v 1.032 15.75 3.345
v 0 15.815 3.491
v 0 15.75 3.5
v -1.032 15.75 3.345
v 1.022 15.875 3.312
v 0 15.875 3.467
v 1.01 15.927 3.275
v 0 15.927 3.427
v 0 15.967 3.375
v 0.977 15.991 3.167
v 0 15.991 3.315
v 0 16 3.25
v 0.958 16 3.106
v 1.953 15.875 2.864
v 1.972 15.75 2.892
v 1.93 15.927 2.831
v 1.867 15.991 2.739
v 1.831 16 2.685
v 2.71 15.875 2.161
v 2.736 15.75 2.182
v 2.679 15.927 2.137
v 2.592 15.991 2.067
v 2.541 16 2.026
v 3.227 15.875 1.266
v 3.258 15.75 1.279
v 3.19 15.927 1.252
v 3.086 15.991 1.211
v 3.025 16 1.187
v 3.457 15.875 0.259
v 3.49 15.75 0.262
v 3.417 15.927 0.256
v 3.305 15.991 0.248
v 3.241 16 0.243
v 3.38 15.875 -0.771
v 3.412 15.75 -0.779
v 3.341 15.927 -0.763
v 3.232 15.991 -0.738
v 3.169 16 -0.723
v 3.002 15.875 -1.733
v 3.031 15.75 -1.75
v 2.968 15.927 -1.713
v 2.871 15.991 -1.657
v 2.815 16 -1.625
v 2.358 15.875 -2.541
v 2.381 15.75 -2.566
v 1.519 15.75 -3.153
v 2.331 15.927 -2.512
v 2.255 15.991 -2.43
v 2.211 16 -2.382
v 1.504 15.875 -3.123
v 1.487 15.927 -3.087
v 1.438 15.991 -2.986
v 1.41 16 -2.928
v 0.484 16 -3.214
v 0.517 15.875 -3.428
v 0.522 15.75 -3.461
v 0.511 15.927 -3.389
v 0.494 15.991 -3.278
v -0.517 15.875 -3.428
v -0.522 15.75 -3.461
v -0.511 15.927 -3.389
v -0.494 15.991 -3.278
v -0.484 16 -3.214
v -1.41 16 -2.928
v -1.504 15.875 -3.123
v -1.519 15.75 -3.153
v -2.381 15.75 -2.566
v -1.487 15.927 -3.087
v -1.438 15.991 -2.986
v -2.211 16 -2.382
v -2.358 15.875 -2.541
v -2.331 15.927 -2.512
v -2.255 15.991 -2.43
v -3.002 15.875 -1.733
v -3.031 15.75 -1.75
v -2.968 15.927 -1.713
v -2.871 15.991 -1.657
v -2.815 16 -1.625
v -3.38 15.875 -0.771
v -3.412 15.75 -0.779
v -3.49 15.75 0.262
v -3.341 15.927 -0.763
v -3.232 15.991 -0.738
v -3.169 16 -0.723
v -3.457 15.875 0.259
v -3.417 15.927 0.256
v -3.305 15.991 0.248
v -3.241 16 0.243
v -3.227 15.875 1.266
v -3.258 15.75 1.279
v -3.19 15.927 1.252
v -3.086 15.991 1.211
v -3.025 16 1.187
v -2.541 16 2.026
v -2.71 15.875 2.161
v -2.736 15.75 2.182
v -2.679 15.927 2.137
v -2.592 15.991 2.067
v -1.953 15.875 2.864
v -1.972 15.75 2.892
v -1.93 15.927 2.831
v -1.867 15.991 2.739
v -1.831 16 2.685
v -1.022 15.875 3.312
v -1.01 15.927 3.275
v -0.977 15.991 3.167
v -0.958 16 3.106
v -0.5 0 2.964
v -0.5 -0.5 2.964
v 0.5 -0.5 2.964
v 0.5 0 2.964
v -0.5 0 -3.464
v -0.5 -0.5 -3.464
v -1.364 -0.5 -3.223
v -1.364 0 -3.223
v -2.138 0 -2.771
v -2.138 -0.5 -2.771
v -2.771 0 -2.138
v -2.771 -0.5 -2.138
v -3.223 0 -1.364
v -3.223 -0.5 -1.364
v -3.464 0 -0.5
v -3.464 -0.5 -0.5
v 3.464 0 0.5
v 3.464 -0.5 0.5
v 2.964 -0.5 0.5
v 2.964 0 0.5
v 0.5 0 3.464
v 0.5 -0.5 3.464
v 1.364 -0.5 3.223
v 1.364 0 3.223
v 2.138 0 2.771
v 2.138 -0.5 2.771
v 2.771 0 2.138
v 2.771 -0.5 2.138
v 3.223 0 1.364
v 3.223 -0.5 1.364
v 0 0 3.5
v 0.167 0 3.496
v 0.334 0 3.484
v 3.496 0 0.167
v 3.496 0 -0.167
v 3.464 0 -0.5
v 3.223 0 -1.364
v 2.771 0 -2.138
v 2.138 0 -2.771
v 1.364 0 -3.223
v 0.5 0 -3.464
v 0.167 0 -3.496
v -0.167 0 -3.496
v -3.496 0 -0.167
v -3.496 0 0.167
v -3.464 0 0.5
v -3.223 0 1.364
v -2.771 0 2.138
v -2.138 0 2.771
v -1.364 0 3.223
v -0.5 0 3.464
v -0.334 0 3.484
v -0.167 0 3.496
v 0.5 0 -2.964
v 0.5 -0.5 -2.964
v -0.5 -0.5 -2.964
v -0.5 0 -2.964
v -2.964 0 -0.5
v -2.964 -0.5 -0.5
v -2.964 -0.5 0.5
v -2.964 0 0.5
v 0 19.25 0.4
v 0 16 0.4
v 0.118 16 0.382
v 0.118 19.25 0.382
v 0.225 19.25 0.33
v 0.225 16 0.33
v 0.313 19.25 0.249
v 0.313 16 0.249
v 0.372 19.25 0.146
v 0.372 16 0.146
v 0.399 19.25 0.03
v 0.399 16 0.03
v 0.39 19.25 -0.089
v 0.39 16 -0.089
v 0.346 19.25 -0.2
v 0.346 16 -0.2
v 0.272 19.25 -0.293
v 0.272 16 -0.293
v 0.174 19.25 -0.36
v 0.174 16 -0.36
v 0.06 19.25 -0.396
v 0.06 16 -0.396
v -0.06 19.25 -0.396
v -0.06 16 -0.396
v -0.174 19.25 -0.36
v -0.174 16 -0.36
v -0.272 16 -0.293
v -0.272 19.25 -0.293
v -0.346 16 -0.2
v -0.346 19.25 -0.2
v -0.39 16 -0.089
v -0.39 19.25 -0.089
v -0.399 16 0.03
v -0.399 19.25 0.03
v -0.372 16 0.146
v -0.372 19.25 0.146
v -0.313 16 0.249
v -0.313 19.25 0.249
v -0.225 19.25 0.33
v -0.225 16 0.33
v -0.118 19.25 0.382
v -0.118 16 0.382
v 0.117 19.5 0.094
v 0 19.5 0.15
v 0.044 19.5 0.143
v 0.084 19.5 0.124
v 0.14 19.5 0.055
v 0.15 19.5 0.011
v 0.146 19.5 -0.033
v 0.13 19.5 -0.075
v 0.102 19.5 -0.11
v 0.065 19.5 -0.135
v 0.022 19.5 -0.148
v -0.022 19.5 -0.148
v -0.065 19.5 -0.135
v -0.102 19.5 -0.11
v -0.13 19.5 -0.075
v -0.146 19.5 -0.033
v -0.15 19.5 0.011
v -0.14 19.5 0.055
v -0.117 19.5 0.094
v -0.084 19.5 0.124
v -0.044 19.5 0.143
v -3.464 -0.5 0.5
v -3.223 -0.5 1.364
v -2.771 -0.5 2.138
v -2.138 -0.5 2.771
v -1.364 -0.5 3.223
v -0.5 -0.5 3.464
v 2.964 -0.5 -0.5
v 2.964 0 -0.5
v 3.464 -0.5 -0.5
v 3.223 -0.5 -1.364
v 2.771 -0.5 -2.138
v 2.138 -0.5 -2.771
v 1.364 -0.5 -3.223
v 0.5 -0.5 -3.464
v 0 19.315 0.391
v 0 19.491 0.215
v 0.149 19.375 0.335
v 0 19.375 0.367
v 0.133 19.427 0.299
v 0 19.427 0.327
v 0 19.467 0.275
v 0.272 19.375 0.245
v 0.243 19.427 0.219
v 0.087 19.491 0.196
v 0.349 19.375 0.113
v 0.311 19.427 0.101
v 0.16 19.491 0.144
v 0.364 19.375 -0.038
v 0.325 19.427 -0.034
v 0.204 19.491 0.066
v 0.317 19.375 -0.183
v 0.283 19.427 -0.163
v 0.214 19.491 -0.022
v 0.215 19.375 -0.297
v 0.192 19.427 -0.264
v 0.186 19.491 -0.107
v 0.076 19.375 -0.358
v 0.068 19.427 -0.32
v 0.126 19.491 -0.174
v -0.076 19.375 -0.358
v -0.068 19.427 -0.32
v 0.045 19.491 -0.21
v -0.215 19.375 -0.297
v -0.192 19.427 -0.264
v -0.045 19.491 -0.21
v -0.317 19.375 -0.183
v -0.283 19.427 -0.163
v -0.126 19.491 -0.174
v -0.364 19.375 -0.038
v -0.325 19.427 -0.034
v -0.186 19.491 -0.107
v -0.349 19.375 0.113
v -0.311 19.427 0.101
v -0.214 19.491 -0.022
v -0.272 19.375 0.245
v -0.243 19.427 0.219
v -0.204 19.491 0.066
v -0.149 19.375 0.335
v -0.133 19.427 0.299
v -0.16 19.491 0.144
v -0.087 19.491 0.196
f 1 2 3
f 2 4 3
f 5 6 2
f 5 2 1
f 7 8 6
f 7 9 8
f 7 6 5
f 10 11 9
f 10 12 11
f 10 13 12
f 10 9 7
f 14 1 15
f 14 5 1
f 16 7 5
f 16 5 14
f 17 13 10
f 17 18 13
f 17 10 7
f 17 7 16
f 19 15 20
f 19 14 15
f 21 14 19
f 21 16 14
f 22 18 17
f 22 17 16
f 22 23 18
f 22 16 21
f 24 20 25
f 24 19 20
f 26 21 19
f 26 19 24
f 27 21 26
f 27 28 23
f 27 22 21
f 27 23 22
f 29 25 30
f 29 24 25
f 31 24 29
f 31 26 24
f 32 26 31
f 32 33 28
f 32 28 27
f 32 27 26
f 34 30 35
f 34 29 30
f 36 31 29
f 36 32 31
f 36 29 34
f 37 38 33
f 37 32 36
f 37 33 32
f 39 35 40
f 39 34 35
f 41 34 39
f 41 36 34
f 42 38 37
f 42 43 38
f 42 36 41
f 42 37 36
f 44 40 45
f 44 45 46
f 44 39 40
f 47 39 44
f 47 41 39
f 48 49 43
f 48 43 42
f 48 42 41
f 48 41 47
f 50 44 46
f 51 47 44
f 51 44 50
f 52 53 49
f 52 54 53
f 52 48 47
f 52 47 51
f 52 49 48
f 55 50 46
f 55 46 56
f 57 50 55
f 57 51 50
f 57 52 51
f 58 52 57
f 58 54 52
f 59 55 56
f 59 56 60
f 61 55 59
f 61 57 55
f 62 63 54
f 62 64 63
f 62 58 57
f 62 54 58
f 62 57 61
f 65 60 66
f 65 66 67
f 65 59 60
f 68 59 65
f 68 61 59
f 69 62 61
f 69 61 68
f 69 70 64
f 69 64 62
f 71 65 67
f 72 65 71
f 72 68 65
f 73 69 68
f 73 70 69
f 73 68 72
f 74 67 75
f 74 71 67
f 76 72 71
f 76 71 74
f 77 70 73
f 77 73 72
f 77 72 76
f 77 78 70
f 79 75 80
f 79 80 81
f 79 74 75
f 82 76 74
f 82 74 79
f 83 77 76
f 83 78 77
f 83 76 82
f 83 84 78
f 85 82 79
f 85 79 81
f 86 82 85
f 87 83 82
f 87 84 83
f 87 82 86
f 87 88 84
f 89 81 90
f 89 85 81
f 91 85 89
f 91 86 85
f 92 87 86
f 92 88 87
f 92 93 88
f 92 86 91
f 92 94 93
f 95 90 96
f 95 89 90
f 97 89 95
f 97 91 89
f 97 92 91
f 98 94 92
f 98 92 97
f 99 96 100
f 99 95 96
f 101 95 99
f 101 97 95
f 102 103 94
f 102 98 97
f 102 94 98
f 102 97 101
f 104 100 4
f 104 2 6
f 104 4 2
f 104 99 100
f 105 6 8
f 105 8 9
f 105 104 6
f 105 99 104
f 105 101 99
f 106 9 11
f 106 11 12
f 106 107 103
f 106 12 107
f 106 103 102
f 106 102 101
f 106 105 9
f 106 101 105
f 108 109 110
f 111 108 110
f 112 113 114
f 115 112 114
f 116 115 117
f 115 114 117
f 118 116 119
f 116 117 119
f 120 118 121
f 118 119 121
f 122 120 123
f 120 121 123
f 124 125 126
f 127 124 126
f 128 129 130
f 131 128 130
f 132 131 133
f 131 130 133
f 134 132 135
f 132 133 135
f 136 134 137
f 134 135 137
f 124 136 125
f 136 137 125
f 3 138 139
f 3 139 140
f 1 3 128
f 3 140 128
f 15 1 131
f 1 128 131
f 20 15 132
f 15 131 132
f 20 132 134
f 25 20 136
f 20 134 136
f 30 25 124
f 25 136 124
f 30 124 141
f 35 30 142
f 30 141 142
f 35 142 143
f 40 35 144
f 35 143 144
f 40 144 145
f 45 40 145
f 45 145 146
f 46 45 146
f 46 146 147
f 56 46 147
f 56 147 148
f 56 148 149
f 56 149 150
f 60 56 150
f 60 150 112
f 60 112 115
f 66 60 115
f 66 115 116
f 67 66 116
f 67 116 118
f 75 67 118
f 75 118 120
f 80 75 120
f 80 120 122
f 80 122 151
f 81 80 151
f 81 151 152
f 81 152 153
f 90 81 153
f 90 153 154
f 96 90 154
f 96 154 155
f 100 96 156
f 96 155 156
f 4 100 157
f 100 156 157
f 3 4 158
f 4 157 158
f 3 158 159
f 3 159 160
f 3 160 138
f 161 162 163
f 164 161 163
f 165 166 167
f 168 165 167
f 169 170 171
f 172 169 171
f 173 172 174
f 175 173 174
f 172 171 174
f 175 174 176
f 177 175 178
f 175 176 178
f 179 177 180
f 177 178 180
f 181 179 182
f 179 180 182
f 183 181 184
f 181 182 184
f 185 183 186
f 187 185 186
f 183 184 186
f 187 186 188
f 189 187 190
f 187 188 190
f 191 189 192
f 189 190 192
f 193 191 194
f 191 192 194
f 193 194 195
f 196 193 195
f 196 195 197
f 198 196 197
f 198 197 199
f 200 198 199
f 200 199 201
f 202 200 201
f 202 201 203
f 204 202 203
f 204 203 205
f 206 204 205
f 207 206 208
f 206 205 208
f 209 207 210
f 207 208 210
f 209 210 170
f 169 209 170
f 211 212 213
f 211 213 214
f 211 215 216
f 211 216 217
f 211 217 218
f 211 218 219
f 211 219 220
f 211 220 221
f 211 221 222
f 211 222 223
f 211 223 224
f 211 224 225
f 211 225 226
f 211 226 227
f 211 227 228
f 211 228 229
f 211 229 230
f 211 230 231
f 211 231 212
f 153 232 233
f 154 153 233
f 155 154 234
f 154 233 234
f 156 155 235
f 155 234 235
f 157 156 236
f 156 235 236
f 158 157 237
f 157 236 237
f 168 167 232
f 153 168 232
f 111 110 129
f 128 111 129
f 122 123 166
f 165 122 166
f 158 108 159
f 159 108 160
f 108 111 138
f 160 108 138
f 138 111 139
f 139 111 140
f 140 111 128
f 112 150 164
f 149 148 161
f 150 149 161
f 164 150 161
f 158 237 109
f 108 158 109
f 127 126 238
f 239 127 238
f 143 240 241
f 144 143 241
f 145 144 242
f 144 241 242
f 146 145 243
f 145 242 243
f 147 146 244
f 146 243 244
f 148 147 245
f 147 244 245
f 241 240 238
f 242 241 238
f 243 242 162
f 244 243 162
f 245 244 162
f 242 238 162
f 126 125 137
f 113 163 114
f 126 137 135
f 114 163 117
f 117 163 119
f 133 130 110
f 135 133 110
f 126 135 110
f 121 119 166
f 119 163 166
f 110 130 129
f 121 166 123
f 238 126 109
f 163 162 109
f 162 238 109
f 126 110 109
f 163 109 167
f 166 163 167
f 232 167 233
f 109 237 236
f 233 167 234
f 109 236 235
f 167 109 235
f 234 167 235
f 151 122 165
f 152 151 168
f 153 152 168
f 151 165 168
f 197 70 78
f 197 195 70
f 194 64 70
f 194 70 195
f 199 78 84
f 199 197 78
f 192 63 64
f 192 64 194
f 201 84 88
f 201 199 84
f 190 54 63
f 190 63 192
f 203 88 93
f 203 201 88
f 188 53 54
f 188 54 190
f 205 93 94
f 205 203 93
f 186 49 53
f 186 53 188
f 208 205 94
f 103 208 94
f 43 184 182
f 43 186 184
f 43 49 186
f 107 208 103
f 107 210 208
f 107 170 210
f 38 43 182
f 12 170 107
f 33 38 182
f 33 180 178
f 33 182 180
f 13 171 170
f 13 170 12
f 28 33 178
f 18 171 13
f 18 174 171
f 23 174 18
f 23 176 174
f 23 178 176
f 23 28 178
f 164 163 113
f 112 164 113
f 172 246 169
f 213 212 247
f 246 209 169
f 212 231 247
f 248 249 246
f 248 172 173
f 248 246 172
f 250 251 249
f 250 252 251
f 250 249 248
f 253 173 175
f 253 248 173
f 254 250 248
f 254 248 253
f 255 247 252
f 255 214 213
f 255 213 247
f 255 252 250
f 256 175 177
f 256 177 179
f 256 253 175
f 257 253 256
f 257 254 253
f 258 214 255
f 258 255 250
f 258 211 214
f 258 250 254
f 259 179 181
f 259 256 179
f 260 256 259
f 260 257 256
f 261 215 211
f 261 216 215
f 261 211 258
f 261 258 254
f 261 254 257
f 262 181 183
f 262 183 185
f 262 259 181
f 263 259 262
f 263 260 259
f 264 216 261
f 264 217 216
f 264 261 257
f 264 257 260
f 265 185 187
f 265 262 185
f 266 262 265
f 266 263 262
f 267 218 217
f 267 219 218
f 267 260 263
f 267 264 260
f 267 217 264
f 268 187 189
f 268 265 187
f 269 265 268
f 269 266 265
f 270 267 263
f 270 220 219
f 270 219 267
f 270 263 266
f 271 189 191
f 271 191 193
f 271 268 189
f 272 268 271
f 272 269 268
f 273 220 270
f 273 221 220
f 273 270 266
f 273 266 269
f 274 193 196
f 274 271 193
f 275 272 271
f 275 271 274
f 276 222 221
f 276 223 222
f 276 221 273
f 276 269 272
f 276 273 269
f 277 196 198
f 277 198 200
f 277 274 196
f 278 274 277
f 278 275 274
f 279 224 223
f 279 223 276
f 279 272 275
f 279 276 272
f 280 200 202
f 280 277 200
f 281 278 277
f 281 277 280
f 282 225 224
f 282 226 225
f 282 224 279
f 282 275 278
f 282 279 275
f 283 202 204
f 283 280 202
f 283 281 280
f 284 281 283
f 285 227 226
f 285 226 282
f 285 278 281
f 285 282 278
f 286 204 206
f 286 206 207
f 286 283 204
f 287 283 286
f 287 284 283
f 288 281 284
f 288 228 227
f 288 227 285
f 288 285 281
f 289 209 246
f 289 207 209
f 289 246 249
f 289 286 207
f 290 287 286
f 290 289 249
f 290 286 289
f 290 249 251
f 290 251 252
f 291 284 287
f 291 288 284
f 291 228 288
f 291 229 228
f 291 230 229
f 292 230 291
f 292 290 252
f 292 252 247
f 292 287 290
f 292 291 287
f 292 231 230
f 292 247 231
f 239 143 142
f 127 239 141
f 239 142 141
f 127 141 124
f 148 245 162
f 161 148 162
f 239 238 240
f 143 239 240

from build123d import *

# Parameters (mm, degrees)
SKETCH1_R           = 3.5
BOSS_EXTRUDE1_DEPTH = 16
BOSS_EXTRUDE2_START = 0.5
BOSS_EXTRUDE2_DEPTH = 0.5
SKETCH3_R           = 0.4
BOSS_EXTRUDE3_DEPTH = 3.5
FILLET2_R           = 0.25
FILLET3_R           = 0.25


with BuildPart() as part:
    # Sketch1 → Boss-Extrude1 (new body)
    with BuildSketch(Plane(origin=(0, 0, 0), x_dir=(1, 0, 0), z_dir=(0, 1, 0))):
        with Locations(Location((0, 0, 0), (0, 0, 270))):
            Circle(SKETCH1_R)
    extrude(amount=BOSS_EXTRUDE1_DEPTH)

    # Sketch2 → Boss-Extrude2 (add)
    with BuildSketch(Plane.XZ.offset(BOSS_EXTRUDE2_START)):
        with BuildLine():
            Line((-0.5, 2.964101615), (0.5, 2.964101615))
            Line((0.5, 2.964101615), (0.5, 3.464101615))
            ThreePointArc((0.5, 3.464101615), (2.474873734, 2.474873734), (3.464101615, 0.5))
            Line((3.464101615, 0.5), (2.964101615, 0.5))
            Line((2.964101615, 0.5), (2.964101615, -0.5))
            Line((2.964101615, -0.5), (3.464101615, -0.5))
            ThreePointArc((3.464101615, -0.5), (2.474873734, -2.474873734), (0.5, -3.464101615))
            Line((0.5, -3.464101615), (0.5, -2.964101615))
            Line((0.5, -2.964101615), (-0.5, -2.964101615))
            Line((-0.5, -2.964101615), (-0.5, -3.464101615))
            ThreePointArc((-0.5, -3.464101615), (-2.474873734, -2.474873734), (-3.464101615, -0.5))
            Line((-3.464101615, -0.5), (-2.964101615, -0.5))
            Line((-2.964101615, -0.5), (-2.964101615, 0.5))
            Line((-2.964101615, 0.5), (-3.464101615, 0.5))
            ThreePointArc((-3.464101615, 0.5), (-2.474873734, 2.474873734), (-0.5, 3.464101615))
            Line((-0.5, 3.464101615), (-0.5, 2.964101615))
        make_face()
    extrude(amount=-BOSS_EXTRUDE2_DEPTH)

    # Sketch3 → Boss-Extrude3 (add)
    with BuildSketch(Plane(origin=(0, 16, 0), x_dir=(1, 0, 0), z_dir=(0, 1, 0))):
        with Locations(Location((0, 0, 0), (0, 0, 270))):
            Circle(SKETCH3_R)
    extrude(amount=BOSS_EXTRUDE3_DEPTH)

    # Fillet2
    fillet2_edges = [part.edges().sort_by_distance(p)[0] for p in [
        (0, 16, -3.5),
    ]]
    fillet(fillet2_edges, radius=FILLET2_R)

    # Fillet3
    fillet3_edges = [part.edges().sort_by_distance(p)[0] for p in [
        (0, 19.5, -0.4),
    ]]
    fillet(fillet3_edges, radius=FILLET3_R)


solid = part.part
